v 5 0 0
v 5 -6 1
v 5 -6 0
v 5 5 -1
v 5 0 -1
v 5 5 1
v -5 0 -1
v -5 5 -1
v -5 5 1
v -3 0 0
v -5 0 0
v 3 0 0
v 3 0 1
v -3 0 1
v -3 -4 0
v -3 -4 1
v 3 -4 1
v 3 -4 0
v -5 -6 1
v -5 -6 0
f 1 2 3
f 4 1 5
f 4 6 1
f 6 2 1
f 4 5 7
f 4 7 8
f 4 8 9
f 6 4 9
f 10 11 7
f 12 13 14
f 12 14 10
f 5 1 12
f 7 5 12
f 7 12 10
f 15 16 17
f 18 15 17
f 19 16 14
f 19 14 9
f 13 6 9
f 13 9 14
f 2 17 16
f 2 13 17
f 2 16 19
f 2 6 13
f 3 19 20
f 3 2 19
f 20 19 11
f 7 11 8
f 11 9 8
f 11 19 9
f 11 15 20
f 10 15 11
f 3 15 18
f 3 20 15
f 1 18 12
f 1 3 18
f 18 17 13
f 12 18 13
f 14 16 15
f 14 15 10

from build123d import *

# Parameters (mm, degrees)
LINEAR_AUSTRAGEN1_DEPTH = 5
SKIZZE2_W               = 6
SKIZZE2_H               = 4
LINEAR_AUSTRAGEN2_DEPTH = 10


with BuildPart() as part:
    # Skizze1 → Linear austragen1 (new body, symmetric)
    with BuildSketch(Plane(origin=(0, 0, 0), x_dir=(0, 0, -1), z_dir=(1, 0, 0))):
        Polygon((0, 0), (1, 0), (1, 5), (-1, 5), (-1, -6), (0, -6), align=None)
    extrude(amount=LINEAR_AUSTRAGEN1_DEPTH, both=True)

    # Skizze2 → Linear austragen2 (cut)
    with BuildSketch(Plane.XY.offset(1)):
        with Locations((0, -2)):
            Rectangle(SKIZZE2_W, SKIZZE2_H)
    extrude(amount=-LINEAR_AUSTRAGEN2_DEPTH, mode=Mode.SUBTRACT)


solid = part.part
